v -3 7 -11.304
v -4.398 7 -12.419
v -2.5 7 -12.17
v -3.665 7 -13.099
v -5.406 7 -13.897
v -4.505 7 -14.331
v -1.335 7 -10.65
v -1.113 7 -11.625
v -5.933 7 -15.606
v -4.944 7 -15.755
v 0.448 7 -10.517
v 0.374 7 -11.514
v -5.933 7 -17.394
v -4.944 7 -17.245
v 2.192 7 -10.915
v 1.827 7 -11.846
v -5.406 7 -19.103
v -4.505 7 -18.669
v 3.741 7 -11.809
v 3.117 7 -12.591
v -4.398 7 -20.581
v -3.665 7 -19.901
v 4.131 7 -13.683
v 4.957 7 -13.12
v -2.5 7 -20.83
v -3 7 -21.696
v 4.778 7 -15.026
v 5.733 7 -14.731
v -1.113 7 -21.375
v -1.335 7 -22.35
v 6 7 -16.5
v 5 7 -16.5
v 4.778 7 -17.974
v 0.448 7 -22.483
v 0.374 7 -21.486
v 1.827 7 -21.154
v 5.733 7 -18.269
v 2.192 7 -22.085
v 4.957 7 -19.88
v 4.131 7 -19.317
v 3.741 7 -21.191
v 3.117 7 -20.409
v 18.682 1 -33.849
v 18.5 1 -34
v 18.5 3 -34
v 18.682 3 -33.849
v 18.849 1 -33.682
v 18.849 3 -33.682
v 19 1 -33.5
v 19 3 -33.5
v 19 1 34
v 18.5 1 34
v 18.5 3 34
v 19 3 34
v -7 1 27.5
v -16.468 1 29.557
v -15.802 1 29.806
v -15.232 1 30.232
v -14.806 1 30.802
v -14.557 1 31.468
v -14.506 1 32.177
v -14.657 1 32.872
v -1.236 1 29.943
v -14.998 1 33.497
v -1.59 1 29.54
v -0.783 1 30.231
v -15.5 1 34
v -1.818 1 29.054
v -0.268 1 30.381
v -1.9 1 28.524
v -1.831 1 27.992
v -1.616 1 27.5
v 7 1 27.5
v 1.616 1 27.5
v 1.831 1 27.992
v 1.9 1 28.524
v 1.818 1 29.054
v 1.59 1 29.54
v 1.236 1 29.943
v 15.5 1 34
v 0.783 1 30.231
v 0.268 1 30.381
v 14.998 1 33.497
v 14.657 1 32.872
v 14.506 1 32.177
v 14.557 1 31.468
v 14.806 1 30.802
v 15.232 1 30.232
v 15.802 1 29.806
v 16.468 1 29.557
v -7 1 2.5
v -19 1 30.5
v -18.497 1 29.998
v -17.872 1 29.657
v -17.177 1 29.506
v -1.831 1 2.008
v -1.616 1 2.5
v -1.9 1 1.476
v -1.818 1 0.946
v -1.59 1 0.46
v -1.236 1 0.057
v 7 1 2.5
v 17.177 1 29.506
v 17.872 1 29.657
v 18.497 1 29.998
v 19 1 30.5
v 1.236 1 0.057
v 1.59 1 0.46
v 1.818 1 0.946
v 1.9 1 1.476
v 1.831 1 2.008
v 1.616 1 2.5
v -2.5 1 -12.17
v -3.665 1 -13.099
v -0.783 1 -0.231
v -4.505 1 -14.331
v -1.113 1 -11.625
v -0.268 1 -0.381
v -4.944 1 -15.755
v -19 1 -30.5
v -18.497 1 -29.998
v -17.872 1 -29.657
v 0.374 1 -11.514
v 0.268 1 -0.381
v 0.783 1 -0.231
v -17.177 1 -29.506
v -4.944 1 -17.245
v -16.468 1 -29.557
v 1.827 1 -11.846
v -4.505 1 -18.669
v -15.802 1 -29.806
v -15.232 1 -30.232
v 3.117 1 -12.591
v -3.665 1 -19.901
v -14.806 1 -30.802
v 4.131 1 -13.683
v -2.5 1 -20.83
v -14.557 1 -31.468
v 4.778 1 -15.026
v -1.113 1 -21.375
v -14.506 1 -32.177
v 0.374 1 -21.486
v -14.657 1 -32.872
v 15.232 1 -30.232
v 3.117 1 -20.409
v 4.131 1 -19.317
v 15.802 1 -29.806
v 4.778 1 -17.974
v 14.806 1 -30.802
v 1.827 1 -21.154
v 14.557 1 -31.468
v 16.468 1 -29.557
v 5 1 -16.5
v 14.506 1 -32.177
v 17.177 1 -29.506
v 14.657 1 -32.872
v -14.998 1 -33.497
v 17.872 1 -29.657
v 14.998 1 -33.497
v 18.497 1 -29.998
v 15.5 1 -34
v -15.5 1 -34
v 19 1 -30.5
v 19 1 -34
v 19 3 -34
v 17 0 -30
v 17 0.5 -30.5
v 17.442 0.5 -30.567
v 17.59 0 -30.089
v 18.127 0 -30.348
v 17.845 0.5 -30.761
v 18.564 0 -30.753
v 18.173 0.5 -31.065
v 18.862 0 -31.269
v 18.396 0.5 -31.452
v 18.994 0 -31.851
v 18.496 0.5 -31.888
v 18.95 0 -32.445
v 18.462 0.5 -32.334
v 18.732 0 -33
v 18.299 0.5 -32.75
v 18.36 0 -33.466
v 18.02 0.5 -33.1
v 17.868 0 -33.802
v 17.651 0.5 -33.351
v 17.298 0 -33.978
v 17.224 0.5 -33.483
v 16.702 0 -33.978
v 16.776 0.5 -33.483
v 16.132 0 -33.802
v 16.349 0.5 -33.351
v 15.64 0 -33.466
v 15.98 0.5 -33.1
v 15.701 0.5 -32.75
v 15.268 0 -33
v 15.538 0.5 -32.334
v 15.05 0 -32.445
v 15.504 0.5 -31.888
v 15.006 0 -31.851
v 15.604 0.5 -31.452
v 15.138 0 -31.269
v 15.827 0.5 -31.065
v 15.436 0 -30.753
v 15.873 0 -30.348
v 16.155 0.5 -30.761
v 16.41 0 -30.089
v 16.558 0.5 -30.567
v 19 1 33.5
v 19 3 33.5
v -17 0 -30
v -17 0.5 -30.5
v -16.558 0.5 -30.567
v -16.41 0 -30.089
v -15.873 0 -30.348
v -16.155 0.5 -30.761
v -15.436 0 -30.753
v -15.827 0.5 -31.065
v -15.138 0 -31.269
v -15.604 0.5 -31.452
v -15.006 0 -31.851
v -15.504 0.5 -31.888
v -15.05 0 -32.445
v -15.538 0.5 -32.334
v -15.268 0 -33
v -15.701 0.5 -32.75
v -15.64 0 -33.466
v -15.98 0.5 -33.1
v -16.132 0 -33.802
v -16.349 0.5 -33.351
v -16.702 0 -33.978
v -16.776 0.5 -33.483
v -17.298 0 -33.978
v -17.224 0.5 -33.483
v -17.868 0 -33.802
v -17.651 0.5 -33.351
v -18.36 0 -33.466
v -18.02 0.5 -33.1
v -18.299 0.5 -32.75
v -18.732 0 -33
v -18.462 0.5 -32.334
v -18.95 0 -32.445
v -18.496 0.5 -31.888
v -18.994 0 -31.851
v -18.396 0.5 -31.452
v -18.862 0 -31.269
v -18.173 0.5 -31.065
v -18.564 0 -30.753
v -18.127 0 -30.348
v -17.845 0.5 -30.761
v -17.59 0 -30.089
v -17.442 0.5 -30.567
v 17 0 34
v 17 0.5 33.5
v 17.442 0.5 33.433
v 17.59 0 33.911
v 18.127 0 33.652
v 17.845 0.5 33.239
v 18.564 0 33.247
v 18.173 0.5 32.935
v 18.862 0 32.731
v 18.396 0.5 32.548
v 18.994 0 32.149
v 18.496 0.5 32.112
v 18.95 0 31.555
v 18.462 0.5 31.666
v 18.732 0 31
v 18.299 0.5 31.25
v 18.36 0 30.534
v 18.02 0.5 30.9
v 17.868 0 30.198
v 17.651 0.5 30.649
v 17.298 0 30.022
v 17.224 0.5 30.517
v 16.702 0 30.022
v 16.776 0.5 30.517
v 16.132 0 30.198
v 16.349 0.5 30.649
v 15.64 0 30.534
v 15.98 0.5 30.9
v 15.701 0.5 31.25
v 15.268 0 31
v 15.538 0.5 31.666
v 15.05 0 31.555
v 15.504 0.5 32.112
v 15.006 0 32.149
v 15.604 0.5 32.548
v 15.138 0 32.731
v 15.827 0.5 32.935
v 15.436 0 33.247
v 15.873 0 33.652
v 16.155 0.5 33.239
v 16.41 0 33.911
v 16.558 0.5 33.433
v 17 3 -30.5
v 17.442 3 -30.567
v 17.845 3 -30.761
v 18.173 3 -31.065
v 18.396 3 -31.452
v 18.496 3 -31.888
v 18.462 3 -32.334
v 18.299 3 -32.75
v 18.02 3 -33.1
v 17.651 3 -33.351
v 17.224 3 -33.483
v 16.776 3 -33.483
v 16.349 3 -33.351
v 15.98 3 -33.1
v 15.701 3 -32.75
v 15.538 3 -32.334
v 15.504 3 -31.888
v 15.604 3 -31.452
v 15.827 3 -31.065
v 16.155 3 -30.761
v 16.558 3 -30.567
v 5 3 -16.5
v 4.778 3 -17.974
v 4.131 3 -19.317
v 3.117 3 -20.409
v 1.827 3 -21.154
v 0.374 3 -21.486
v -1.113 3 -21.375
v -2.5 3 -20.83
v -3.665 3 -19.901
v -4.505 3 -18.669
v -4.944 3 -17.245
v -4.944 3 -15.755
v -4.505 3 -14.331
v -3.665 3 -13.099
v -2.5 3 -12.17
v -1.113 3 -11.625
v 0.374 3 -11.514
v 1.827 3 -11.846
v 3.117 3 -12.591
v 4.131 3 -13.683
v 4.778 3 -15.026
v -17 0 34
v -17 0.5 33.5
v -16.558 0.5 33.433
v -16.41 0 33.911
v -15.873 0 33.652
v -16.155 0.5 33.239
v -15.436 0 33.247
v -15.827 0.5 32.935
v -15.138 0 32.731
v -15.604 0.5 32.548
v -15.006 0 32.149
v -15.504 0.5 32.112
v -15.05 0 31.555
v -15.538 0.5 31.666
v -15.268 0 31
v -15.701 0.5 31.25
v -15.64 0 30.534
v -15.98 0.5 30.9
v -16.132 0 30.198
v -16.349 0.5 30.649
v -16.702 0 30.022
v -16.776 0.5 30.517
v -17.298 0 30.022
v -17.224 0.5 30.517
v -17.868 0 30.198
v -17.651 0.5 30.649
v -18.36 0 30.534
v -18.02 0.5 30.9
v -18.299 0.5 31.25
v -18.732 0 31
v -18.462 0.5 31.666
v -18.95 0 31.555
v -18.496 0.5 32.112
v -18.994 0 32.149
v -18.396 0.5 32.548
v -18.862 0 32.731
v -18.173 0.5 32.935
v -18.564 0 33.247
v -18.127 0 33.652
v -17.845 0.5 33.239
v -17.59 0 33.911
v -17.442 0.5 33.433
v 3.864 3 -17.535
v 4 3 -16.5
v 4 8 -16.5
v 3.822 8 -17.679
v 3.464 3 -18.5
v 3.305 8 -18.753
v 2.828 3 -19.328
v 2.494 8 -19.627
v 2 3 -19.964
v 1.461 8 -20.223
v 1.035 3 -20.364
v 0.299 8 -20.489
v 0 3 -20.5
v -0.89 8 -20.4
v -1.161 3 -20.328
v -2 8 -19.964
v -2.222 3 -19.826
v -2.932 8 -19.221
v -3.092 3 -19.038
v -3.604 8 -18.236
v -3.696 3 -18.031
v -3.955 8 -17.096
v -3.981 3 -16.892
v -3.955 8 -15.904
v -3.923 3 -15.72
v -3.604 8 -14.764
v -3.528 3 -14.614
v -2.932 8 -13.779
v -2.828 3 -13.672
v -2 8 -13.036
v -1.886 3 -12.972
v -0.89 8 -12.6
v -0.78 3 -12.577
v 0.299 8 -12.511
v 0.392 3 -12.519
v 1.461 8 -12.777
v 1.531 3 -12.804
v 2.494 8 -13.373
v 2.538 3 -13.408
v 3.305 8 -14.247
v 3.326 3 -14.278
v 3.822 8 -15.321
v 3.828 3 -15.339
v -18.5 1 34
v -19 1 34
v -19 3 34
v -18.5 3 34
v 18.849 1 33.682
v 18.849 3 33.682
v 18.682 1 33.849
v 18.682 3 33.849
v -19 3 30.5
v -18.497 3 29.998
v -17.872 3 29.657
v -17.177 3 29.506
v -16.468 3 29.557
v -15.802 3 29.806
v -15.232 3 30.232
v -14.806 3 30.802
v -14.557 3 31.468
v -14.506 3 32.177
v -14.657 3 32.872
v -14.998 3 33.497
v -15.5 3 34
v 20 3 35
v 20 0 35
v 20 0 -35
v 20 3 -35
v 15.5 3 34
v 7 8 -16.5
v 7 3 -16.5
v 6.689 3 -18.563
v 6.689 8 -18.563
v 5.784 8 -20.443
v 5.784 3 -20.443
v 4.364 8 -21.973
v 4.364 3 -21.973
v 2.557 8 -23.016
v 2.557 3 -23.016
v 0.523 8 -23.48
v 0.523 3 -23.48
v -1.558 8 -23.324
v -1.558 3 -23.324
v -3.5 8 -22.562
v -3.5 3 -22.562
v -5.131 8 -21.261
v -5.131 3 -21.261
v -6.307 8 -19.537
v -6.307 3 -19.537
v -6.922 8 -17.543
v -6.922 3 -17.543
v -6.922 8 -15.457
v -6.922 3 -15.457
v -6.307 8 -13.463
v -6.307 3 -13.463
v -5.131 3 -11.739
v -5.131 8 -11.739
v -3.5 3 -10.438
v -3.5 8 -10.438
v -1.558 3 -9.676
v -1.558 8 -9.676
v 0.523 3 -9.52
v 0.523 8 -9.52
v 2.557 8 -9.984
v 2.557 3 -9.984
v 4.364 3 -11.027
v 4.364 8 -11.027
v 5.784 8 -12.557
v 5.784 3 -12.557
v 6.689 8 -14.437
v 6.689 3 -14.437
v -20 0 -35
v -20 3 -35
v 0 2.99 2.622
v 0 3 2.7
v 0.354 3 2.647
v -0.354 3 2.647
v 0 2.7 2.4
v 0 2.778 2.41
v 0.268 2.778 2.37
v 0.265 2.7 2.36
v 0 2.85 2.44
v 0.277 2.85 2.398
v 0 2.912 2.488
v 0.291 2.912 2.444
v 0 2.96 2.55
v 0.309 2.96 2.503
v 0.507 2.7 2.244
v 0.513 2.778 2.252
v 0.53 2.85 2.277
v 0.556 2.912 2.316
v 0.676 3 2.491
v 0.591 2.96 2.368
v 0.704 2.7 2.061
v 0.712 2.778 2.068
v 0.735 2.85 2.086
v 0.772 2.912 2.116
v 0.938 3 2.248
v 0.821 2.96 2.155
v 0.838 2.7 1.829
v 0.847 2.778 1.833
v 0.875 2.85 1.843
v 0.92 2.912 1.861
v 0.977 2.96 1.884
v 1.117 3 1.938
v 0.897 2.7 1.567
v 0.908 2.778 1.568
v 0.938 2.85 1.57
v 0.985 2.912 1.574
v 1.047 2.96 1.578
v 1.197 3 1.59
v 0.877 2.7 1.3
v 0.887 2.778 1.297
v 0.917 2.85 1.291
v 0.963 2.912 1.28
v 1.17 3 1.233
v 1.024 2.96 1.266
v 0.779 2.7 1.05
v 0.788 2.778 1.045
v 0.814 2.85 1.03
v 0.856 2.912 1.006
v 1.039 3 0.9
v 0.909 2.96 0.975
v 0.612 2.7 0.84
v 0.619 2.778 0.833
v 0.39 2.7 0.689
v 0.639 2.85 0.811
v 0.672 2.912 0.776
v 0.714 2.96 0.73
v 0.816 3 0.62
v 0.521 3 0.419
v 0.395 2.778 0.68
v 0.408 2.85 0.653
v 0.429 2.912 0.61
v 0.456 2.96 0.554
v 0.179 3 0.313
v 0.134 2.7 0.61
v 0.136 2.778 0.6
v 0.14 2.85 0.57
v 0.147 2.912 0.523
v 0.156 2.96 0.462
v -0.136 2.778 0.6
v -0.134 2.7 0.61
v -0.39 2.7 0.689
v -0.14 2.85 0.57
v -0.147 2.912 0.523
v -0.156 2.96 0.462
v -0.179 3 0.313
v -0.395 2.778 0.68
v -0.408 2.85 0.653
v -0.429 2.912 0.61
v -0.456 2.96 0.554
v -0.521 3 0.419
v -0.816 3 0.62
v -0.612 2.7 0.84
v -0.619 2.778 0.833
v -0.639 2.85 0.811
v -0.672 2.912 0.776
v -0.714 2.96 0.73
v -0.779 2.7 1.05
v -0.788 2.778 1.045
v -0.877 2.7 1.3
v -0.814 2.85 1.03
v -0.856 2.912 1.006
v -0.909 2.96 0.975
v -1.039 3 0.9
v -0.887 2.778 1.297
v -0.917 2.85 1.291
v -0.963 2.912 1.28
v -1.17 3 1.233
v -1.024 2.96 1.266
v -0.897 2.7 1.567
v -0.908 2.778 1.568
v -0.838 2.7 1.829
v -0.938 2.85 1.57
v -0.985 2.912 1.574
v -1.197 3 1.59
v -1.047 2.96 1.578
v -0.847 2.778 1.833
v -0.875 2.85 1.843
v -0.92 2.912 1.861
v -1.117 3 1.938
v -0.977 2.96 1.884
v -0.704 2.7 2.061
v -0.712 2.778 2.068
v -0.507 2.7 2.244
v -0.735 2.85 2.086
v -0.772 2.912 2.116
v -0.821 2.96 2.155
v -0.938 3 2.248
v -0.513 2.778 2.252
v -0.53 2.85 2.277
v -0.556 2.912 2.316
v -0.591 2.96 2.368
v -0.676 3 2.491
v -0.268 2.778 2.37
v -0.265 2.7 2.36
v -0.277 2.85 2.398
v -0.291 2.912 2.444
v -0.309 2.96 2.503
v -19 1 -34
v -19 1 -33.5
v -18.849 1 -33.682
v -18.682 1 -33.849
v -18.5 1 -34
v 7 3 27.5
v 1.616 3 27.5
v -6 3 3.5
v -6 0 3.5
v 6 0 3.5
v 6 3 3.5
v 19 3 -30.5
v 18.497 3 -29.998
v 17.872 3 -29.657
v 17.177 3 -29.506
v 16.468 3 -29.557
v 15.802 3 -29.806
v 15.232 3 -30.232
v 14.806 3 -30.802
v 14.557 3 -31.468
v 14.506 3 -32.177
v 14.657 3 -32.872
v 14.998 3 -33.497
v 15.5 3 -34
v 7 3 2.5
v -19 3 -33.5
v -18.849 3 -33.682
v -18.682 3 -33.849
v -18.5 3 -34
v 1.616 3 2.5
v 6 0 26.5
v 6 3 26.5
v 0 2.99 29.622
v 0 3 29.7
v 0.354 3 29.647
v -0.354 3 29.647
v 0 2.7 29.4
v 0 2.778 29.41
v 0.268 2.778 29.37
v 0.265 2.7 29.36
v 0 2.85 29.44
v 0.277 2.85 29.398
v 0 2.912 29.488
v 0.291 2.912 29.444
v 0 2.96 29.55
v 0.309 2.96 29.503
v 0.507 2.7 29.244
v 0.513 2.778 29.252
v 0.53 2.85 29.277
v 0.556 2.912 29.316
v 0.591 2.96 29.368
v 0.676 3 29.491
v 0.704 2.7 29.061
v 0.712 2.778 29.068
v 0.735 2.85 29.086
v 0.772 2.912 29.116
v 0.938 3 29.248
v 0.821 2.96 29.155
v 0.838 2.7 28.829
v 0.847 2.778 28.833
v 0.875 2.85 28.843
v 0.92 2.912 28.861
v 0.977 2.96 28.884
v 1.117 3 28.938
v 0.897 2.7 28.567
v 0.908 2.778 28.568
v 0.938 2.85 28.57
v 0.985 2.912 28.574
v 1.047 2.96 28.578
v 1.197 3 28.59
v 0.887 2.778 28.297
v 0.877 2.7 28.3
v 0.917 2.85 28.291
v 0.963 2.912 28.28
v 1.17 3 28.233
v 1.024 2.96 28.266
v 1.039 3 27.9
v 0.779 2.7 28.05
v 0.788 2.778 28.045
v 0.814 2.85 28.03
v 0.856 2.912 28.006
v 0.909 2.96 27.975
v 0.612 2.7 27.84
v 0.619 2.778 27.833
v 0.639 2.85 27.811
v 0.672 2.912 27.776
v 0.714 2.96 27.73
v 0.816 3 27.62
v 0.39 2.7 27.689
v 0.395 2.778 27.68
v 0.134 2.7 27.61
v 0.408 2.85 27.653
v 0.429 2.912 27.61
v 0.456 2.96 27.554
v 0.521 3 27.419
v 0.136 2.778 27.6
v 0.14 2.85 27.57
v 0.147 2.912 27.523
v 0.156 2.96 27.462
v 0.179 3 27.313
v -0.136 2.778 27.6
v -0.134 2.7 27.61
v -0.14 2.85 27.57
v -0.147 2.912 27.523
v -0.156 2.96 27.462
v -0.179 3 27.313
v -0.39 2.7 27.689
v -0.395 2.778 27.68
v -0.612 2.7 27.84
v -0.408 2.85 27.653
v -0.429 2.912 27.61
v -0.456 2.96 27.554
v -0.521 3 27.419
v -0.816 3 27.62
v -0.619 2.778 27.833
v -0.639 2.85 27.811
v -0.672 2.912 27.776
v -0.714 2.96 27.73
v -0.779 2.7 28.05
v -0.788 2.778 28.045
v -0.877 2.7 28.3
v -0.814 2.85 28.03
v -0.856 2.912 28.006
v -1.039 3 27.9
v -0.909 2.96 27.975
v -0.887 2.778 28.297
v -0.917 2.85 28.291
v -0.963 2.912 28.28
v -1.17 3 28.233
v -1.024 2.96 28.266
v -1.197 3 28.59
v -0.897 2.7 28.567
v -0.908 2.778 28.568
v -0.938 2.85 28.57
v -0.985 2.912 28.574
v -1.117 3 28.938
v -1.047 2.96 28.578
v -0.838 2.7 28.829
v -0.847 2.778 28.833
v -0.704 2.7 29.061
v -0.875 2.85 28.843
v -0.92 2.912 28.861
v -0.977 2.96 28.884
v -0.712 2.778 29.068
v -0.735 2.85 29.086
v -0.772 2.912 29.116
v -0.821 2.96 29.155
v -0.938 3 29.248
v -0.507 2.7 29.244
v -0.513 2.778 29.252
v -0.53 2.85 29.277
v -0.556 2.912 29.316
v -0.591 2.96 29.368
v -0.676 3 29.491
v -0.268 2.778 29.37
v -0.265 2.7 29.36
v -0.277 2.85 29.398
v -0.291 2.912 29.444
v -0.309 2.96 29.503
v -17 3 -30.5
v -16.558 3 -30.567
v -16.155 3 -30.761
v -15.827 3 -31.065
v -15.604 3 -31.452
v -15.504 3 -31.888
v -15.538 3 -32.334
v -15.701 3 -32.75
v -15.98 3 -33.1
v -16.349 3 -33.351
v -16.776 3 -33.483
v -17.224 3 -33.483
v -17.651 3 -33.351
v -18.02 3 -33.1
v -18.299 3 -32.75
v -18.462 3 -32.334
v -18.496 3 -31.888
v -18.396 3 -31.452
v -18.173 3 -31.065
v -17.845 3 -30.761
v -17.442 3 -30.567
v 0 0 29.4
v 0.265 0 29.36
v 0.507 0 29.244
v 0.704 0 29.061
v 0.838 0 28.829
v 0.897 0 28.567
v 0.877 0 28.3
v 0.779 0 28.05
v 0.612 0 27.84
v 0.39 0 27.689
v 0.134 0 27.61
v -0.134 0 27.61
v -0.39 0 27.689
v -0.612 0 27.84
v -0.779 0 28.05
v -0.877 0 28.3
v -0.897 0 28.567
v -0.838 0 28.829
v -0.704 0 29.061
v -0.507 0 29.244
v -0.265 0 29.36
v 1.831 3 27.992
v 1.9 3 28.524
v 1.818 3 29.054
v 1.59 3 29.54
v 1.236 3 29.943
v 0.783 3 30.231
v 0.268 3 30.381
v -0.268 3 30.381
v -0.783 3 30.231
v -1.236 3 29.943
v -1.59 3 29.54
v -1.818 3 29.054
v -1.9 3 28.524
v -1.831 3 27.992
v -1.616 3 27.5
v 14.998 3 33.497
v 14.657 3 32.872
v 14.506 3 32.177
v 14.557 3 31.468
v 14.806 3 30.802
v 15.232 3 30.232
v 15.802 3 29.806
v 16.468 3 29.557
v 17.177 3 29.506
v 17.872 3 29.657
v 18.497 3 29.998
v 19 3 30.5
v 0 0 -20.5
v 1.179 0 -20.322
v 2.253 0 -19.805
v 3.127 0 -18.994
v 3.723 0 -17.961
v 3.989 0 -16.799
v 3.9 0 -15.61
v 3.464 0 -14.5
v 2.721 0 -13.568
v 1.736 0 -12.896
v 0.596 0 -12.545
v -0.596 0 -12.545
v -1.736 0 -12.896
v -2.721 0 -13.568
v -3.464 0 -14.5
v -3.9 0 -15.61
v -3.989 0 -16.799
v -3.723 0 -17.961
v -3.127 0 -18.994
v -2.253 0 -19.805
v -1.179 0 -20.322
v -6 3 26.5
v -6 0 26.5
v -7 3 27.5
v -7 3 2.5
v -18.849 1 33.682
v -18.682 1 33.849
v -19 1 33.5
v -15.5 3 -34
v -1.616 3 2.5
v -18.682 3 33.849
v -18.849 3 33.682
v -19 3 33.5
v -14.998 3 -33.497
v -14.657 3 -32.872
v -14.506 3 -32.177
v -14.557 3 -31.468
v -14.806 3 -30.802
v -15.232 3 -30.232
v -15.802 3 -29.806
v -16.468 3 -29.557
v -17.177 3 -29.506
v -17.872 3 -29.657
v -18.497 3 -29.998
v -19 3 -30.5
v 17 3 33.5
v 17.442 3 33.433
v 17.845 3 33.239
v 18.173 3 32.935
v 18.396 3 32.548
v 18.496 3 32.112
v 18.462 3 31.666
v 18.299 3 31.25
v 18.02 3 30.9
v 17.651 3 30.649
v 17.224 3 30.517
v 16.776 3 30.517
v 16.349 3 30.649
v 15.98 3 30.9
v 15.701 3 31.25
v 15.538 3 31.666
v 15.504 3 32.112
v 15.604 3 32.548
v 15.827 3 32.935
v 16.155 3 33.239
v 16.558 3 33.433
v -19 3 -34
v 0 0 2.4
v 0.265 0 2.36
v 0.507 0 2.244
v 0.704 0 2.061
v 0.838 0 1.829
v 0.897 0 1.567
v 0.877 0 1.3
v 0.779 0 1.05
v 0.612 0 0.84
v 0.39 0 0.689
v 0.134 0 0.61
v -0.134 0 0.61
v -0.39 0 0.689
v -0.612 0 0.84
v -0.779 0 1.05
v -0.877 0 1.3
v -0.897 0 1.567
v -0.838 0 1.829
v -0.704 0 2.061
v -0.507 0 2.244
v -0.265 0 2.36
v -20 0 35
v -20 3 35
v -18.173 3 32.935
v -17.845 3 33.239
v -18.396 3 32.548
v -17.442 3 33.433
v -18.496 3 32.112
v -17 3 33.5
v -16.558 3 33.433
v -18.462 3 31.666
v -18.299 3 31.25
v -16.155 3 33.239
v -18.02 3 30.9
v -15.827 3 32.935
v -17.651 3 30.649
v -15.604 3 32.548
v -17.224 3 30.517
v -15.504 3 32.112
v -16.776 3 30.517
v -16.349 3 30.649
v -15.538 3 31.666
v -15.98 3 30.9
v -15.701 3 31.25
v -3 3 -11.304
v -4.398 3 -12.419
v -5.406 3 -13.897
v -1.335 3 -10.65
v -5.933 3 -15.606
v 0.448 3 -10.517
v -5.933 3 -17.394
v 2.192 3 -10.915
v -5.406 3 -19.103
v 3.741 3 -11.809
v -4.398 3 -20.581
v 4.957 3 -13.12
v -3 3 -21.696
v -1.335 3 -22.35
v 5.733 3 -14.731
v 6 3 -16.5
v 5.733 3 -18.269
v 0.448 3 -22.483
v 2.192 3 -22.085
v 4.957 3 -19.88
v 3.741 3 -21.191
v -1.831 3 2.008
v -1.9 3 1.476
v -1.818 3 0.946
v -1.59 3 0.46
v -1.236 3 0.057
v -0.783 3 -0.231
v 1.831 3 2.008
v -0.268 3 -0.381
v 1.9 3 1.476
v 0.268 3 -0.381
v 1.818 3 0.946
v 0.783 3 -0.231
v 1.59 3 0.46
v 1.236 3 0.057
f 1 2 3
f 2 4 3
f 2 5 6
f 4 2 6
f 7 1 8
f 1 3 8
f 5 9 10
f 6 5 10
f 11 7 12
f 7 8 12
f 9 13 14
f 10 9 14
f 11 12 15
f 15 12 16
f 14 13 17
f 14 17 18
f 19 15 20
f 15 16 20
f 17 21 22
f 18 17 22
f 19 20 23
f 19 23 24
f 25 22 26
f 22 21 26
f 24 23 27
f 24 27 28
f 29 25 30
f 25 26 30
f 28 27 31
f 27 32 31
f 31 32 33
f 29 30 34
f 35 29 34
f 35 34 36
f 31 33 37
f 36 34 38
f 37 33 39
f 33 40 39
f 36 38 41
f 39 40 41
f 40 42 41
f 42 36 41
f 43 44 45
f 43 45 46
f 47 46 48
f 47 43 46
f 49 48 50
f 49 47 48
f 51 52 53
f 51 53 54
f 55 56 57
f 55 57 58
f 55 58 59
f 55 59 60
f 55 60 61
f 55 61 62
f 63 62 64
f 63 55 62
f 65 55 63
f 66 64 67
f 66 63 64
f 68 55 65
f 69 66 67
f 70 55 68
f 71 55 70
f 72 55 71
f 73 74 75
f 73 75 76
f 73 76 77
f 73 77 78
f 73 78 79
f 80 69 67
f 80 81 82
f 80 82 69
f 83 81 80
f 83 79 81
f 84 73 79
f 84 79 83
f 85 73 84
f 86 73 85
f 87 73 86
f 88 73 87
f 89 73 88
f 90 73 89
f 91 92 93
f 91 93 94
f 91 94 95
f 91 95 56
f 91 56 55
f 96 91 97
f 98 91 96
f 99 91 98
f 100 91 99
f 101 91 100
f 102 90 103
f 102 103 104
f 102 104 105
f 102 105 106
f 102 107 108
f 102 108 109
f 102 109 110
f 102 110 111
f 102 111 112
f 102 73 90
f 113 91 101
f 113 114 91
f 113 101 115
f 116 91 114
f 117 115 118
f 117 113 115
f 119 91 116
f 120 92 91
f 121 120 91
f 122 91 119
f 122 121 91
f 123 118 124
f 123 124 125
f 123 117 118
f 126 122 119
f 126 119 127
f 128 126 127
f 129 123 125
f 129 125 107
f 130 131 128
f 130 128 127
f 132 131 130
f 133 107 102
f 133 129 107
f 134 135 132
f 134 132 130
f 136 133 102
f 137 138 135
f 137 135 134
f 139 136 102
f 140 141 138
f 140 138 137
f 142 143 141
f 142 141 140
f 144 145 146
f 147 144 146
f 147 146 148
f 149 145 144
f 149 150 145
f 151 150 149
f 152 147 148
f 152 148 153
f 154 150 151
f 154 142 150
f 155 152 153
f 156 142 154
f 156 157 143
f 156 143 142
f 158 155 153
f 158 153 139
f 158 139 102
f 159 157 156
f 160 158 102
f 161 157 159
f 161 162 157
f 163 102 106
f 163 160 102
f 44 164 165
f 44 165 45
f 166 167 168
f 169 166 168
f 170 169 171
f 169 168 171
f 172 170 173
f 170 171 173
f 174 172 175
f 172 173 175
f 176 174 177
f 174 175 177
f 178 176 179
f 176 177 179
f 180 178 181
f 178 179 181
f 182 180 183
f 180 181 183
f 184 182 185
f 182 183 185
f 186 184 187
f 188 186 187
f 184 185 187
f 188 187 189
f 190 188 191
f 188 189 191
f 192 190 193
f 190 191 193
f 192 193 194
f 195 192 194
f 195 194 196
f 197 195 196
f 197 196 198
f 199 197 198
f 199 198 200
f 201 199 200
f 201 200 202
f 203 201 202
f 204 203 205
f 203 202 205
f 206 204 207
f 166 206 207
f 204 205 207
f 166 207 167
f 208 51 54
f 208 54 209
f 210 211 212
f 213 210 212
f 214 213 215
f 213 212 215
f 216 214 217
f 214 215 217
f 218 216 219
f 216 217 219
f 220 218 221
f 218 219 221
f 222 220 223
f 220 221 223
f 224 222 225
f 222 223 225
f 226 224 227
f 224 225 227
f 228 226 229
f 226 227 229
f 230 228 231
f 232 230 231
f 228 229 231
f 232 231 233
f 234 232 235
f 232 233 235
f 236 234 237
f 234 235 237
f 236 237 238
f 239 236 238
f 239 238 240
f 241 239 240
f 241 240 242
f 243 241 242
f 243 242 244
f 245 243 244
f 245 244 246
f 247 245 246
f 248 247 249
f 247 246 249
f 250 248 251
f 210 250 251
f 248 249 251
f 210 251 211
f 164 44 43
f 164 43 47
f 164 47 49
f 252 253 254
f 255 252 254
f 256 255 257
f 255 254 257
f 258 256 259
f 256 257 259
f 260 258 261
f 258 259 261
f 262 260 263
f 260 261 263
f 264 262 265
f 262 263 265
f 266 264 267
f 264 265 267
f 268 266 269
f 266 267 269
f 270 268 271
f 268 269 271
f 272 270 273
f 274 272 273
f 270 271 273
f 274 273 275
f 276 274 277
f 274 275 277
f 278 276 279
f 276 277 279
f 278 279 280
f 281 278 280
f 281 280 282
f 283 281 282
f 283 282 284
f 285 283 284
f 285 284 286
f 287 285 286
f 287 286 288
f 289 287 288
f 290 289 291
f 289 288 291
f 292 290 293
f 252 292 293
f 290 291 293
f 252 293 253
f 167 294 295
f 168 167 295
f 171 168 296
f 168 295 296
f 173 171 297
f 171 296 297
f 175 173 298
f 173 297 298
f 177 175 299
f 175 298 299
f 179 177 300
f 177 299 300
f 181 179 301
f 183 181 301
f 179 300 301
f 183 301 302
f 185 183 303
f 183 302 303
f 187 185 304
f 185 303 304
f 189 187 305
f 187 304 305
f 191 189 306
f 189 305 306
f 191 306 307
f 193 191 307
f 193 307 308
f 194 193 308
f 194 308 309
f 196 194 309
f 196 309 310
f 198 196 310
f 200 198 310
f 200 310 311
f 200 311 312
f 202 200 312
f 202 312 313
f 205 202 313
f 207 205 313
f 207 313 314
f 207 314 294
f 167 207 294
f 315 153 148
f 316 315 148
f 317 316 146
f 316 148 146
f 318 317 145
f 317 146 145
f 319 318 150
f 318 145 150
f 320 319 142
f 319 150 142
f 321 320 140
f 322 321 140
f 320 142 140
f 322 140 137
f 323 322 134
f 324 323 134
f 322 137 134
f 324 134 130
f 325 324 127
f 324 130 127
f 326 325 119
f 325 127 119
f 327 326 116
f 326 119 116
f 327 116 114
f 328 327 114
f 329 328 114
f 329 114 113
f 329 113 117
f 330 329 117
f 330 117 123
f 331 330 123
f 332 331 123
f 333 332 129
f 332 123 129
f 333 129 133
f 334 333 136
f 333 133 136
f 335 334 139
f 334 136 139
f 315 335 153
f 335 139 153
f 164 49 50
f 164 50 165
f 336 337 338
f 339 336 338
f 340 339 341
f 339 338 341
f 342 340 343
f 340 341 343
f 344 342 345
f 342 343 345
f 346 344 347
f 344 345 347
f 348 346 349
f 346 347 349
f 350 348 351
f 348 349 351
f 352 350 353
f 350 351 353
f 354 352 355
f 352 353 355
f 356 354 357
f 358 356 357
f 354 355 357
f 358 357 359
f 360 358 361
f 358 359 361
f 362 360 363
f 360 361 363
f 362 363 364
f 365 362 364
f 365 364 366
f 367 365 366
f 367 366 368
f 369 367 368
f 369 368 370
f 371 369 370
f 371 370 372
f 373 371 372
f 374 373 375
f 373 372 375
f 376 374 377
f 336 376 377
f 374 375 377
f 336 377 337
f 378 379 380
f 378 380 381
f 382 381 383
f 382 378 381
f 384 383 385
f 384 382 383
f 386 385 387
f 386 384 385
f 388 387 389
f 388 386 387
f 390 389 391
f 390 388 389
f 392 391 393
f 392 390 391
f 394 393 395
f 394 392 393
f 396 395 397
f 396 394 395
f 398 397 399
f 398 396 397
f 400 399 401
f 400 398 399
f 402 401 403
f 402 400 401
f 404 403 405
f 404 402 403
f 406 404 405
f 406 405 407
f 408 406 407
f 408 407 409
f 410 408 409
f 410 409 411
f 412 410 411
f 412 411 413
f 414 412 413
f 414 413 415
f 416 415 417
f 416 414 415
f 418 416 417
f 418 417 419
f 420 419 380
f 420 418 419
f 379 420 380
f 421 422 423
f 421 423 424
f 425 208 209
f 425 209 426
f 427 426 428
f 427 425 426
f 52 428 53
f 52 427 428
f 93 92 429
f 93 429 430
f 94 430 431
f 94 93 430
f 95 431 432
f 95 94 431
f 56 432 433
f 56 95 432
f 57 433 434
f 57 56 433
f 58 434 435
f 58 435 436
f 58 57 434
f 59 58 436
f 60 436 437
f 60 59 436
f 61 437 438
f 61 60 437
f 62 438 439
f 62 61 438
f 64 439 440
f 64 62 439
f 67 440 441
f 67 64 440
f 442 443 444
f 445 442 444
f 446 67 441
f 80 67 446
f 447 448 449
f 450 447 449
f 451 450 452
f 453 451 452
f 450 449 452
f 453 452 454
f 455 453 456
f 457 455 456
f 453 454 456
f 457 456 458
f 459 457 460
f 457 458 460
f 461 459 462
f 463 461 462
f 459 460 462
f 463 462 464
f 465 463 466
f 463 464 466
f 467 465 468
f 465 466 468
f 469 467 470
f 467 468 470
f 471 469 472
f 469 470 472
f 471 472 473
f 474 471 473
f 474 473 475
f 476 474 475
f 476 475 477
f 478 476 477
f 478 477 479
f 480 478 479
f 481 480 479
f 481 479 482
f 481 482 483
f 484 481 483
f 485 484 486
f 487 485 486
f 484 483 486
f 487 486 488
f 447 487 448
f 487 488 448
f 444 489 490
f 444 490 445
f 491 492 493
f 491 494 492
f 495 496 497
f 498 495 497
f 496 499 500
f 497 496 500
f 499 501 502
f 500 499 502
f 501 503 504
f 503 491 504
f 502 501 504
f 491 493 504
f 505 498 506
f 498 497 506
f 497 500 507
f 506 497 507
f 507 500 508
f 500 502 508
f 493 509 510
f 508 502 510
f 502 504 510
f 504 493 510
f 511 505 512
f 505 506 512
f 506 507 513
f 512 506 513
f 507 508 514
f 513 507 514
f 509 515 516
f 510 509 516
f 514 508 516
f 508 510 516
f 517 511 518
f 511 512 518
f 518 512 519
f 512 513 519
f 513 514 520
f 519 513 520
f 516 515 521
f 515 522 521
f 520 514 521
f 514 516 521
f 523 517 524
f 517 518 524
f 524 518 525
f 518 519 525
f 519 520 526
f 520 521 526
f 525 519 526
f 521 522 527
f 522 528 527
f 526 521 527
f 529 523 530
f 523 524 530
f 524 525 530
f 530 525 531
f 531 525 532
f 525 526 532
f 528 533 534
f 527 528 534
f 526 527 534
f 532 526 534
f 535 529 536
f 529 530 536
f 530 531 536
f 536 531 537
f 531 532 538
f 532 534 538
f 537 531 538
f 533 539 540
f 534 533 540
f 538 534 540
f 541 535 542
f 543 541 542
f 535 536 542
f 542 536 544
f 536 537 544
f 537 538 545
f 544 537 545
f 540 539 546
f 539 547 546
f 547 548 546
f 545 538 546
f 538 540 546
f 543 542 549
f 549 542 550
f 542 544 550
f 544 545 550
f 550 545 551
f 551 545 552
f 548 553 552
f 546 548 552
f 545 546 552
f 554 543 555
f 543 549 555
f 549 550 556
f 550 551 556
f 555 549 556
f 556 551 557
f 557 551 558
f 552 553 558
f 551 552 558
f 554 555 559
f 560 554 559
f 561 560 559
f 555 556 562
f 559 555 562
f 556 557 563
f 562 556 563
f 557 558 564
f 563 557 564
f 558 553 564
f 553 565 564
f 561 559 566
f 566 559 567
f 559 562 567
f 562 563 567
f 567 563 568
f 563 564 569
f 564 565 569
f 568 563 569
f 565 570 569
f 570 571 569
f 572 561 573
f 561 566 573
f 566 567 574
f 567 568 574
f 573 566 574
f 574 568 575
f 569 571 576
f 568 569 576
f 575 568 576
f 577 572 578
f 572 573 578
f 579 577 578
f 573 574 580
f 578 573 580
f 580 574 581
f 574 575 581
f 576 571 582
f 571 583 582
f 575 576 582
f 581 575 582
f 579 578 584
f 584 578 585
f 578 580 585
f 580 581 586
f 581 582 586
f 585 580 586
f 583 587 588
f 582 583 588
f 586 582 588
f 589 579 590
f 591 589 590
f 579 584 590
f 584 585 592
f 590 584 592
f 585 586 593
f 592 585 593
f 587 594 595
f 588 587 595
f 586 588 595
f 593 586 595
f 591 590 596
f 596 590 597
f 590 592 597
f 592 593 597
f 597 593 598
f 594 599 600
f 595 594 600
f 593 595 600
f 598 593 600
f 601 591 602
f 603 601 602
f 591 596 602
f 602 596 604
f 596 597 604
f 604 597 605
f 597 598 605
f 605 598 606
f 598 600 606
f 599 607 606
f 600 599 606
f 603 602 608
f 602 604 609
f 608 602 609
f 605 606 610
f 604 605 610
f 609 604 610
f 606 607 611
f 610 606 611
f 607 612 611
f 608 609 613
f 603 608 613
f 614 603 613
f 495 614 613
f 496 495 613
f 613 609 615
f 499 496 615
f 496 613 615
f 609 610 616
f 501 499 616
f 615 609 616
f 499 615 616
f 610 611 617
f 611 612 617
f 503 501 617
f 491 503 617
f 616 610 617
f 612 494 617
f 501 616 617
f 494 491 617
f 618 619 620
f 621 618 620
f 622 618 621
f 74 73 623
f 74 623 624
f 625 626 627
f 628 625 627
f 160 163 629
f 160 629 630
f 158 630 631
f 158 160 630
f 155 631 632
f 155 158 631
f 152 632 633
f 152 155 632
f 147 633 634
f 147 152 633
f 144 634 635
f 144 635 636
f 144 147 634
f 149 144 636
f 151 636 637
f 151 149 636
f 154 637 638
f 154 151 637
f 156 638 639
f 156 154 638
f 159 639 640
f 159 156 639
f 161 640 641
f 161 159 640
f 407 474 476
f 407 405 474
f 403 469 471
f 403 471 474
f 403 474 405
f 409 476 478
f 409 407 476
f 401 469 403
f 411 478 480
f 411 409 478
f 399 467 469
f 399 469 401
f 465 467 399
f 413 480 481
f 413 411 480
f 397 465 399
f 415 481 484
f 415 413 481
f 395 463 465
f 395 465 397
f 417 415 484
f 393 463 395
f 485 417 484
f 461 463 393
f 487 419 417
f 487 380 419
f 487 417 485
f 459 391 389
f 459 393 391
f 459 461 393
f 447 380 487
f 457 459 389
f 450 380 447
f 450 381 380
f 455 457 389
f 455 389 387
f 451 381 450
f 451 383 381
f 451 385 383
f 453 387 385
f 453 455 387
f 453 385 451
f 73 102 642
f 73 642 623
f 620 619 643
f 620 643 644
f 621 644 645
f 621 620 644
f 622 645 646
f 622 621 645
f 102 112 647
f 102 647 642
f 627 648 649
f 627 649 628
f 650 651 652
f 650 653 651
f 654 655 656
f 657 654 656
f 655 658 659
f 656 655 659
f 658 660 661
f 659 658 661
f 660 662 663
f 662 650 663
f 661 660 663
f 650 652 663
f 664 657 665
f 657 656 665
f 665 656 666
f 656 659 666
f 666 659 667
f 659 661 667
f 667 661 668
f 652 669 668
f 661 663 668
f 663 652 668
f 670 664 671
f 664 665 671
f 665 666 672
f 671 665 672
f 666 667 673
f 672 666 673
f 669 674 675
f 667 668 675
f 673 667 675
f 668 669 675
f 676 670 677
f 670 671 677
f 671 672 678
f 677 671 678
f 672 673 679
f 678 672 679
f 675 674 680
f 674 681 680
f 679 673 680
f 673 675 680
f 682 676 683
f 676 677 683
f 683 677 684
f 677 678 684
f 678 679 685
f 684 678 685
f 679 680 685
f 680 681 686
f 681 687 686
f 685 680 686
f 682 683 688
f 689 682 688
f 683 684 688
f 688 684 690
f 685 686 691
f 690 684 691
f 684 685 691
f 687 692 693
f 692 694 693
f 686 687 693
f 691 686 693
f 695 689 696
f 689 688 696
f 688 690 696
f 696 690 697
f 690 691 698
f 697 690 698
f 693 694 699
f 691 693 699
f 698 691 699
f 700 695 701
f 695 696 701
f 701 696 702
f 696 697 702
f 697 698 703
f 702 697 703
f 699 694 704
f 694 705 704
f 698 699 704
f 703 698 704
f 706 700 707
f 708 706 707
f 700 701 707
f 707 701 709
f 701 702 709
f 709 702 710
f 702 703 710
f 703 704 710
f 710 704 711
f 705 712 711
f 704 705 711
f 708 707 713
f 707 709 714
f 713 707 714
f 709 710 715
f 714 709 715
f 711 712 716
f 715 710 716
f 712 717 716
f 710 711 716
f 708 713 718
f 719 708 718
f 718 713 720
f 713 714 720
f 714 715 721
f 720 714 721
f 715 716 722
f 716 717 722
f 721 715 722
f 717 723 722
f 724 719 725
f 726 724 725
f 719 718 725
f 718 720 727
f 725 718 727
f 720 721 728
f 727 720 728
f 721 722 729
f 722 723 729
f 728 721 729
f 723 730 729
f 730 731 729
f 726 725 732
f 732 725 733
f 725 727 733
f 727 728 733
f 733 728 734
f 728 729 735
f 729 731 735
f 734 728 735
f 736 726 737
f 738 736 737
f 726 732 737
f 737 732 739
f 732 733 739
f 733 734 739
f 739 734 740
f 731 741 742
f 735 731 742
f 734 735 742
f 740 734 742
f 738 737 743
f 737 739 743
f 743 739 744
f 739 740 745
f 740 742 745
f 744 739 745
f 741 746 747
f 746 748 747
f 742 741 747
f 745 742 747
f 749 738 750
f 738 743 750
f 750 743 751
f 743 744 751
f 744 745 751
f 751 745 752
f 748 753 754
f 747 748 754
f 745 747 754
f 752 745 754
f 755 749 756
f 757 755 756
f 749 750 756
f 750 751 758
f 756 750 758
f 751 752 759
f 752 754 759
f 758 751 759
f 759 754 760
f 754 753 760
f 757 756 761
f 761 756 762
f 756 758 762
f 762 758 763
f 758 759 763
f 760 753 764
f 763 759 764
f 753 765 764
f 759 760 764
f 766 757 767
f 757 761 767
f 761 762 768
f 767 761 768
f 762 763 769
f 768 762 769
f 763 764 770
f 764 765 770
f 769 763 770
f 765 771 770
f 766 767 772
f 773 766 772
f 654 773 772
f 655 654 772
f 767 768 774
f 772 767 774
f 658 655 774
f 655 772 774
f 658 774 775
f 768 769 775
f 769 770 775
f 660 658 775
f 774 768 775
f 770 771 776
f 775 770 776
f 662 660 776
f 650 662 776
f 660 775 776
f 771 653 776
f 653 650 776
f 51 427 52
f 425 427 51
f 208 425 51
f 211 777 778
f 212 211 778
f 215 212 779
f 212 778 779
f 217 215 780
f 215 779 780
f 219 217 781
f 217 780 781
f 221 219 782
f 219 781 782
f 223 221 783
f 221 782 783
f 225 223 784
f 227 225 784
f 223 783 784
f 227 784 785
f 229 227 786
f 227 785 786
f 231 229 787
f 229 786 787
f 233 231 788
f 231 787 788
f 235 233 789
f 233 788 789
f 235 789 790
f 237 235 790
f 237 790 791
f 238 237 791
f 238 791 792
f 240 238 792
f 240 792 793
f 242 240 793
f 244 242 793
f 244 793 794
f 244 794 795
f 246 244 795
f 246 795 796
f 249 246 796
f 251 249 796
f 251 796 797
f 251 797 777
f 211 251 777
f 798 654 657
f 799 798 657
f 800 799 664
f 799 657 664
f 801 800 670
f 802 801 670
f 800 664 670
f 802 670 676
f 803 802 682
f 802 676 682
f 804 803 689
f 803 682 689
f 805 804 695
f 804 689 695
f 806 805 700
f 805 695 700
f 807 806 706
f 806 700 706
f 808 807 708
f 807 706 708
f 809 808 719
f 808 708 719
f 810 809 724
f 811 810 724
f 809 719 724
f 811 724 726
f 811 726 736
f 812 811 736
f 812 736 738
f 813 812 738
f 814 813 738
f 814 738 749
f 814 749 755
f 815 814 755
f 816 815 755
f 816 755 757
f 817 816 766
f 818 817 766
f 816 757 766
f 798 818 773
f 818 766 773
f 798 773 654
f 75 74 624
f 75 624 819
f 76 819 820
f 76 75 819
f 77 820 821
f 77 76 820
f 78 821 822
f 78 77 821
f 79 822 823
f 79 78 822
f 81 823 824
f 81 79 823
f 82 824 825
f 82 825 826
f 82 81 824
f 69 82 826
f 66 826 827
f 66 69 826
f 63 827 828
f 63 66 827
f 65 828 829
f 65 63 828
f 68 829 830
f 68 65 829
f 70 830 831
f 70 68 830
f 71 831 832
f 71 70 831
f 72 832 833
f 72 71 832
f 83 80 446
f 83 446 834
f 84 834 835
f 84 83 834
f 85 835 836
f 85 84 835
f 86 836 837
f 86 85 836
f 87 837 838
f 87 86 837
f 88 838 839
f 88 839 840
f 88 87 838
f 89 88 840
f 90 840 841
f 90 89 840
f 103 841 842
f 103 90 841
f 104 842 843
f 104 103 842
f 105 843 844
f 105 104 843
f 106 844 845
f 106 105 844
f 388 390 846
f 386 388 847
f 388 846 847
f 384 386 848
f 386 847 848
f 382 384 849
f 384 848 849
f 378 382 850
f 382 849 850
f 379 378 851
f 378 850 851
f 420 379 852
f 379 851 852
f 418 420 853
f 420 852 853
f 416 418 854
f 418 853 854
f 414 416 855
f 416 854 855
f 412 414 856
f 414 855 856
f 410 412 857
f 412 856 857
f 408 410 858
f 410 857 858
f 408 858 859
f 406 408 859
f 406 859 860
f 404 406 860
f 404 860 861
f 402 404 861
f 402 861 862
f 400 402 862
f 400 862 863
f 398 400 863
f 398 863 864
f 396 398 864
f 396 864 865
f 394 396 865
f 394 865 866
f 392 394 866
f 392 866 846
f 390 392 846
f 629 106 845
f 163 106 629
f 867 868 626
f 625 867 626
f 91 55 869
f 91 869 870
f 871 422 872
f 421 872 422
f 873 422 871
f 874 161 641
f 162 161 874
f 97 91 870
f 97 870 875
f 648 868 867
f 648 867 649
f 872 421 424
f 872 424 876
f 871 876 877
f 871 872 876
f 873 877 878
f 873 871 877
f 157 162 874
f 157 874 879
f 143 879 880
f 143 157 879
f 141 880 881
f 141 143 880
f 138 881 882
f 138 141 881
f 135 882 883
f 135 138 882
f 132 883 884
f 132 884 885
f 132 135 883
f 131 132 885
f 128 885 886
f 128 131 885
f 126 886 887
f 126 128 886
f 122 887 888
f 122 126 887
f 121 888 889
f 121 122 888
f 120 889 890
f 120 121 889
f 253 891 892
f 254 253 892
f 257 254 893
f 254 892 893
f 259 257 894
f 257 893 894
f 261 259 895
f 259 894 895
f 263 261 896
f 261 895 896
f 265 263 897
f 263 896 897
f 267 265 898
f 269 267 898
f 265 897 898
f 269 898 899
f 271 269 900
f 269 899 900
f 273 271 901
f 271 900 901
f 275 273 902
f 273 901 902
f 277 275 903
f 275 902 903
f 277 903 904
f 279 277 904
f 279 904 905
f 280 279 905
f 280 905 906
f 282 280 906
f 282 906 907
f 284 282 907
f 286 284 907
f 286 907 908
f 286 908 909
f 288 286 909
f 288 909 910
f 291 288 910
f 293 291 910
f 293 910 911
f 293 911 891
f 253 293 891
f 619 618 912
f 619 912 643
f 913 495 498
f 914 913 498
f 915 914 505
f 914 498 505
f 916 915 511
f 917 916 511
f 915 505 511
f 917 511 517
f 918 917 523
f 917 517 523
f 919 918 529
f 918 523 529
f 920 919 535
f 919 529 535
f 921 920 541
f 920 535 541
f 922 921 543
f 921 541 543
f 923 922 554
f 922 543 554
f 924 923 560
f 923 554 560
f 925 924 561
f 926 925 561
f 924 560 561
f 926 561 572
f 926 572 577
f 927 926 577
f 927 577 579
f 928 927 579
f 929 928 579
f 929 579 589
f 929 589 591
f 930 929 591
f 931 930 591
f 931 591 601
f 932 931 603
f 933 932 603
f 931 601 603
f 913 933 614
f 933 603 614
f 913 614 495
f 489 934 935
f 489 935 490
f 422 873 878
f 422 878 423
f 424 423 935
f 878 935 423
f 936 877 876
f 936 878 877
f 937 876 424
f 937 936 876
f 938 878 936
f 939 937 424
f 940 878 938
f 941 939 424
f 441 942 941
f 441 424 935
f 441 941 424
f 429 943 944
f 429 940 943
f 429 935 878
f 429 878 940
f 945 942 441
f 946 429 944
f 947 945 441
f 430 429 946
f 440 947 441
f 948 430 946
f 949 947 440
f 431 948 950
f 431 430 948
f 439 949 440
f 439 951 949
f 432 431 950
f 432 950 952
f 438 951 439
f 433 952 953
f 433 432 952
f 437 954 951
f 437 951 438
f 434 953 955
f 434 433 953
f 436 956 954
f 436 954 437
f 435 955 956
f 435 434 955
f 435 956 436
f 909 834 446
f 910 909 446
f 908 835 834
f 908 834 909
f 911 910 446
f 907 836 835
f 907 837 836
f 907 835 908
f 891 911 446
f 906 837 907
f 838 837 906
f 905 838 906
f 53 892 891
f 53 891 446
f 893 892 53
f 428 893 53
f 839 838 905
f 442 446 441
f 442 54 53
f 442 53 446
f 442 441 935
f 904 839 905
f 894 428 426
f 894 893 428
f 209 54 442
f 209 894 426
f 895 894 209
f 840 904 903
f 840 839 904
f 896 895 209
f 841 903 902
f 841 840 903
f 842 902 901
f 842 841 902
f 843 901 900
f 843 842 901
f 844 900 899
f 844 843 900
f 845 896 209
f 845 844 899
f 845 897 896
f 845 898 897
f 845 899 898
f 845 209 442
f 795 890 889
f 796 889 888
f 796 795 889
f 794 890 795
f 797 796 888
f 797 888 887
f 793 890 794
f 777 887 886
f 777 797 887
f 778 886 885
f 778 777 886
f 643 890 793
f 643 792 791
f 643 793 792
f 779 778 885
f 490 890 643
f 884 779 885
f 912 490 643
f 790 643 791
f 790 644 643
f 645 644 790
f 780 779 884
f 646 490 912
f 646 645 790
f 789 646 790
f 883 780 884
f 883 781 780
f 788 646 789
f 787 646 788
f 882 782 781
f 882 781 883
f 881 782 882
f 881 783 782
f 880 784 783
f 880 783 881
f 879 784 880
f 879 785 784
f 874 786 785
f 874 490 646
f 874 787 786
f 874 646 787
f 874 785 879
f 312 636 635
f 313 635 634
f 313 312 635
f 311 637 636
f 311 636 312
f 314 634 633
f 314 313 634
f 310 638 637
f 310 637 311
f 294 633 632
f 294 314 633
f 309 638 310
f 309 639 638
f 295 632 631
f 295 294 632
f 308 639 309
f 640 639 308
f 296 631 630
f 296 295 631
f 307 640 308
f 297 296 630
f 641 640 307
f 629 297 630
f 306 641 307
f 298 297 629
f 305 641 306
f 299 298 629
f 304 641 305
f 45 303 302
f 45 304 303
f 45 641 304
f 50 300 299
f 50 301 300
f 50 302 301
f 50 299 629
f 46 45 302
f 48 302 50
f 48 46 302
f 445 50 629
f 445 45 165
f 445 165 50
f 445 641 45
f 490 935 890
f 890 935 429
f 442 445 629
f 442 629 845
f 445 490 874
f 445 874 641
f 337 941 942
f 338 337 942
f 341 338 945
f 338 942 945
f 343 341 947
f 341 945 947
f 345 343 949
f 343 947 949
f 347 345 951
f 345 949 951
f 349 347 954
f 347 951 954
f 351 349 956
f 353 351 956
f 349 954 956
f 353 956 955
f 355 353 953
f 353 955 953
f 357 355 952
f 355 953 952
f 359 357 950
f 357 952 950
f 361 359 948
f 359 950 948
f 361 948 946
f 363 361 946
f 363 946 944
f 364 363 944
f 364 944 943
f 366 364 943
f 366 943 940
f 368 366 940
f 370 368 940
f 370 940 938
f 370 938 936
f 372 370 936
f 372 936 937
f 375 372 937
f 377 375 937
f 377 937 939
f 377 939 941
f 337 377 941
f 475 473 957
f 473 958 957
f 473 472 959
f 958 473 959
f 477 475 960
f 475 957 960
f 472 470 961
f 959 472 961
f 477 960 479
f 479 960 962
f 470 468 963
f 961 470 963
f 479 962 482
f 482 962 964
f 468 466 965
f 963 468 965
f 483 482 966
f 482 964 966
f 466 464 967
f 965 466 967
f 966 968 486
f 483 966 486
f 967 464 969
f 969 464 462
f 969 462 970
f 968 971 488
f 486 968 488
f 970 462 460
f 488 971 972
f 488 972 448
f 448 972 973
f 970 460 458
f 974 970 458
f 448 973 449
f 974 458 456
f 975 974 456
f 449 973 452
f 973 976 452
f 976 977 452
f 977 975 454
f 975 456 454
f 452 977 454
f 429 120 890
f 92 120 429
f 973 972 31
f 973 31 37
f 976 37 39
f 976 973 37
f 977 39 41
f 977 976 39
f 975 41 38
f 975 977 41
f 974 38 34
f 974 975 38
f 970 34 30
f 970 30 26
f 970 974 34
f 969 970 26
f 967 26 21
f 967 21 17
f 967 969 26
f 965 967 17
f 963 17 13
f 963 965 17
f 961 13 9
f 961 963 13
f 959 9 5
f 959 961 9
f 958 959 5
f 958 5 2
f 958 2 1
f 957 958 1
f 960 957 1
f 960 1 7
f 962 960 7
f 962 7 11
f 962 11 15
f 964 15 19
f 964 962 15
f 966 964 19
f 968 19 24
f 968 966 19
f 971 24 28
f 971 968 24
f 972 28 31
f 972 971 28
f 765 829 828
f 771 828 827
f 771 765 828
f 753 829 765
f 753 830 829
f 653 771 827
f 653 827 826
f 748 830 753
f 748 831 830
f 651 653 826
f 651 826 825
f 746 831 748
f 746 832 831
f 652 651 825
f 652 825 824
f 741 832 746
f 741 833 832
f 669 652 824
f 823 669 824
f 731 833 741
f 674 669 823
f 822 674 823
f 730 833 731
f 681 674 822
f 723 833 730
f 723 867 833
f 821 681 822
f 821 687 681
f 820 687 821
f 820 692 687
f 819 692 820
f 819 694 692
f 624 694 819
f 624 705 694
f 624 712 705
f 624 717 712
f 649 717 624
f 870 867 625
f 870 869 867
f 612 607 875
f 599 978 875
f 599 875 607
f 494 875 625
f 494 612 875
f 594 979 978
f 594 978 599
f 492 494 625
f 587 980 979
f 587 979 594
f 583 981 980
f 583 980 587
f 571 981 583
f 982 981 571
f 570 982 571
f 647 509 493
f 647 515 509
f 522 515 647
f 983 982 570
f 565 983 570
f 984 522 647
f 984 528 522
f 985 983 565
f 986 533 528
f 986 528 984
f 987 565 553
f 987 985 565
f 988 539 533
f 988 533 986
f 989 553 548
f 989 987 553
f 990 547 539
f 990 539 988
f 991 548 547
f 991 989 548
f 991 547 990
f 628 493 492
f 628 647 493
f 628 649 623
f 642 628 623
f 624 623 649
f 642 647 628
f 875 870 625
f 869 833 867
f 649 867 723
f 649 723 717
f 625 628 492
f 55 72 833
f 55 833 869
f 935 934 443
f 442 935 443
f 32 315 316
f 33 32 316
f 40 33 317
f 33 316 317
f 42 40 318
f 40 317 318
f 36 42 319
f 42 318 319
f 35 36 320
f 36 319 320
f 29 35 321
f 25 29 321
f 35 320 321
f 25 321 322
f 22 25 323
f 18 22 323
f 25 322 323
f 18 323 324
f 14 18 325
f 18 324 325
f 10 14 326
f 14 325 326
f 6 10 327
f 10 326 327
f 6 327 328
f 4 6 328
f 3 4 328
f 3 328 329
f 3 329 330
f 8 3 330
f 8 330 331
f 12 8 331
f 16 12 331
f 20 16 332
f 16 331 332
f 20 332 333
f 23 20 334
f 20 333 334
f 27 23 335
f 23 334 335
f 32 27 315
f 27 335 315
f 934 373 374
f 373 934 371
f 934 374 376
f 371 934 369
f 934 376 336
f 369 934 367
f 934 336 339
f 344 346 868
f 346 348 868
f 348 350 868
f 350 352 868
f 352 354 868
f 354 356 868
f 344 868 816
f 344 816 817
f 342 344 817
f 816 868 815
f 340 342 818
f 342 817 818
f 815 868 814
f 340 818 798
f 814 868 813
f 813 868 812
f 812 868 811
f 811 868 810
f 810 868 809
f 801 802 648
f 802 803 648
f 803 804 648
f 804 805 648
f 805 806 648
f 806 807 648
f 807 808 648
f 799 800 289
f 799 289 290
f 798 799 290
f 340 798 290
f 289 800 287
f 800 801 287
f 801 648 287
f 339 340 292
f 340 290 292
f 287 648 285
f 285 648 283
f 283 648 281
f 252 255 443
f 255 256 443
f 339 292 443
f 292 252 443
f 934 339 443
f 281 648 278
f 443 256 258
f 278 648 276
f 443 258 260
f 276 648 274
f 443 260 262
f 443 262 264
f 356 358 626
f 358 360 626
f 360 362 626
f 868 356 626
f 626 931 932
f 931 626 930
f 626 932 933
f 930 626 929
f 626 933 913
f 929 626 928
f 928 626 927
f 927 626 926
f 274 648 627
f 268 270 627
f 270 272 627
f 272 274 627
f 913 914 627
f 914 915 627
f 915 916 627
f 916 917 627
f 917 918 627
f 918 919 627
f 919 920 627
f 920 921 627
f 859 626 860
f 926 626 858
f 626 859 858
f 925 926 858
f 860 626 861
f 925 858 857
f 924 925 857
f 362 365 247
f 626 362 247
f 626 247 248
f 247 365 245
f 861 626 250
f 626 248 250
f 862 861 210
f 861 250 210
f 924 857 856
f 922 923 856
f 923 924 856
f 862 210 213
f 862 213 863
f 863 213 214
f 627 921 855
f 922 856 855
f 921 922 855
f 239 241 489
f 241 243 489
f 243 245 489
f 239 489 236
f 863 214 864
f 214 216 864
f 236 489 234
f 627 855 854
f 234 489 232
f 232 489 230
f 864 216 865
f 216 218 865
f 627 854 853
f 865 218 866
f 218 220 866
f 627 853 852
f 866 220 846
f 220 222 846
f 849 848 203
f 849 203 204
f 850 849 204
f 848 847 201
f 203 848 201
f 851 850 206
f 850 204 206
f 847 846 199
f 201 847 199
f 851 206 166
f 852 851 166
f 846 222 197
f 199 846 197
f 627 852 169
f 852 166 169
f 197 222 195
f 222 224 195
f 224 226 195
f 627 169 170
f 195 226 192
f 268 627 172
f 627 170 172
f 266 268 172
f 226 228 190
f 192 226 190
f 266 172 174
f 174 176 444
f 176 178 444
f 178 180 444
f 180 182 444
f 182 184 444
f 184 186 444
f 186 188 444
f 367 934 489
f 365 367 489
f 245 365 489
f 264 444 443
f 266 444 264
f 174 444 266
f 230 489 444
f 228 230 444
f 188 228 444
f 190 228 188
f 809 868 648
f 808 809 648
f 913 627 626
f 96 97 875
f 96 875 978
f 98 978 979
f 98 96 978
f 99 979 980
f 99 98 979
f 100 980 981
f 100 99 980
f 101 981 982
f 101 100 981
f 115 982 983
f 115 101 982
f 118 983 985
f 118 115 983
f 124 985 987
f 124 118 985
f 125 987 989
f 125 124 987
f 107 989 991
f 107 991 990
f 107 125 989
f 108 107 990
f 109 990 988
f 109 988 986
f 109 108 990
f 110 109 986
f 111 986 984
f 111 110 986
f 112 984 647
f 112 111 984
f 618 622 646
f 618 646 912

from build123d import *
from build123d.topology import SkipClean

# Parameters (mm, degrees)
SKETCH_1_W            = 40
SKETCH_1_H            = 70
SKETCH_1_W_2          = 12
SKETCH_1_H_2          = 23
EXTRUDE_1_DEPTH       = 3
SKETCH_2_R            = 0.9
CUT_EXTRUDE_1_DEPTH   = 3
SKETCH_3_R            = 1.5
CUT_EXTRUDE_2_DEPTH   = 41.422765863
CHAMFER_1_SIZE        = 0.5
FILLET_1_R            = 0.3
SKETCH_4_R            = 4
CUT_EXTRUDE_3_DEPTH   = 41.422765863
SKETCH_6_R            = 7
SKETCH_6_R_2          = 4
EXTRUDE_1_2_DEPTH     = 5
SHELL_START           = 1
SHELL_1_OUTLINE_R     = 5
SHELL_1_DEPTH         = 2
SHELL_START_2         = 3
SHELL_1_2_OUTLINE_R   = 6
SHELL_1_2_OUTLINE_R_2 = 5
SHELL_1_2_DEPTH       = 4


# Read off the part's stored shape, not the designer's step: 抽壳1
with BuildPart() as part:
    # 草图1 → Extrude 1 (new body)
    with BuildSketch(Plane(origin=(0, 0, 0), x_dir=(1, 0, 0), z_dir=(0, 1, 0))):
        Rectangle(SKETCH_1_W, SKETCH_1_H)
        with Locations((0, -15)):
            Rectangle(SKETCH_1_W_2, SKETCH_1_H_2, mode=Mode.SUBTRACT)
    extrude(amount=EXTRUDE_1_DEPTH)

    # 草图2 → 切除-拉伸1 (cut)
    with BuildSketch(Plane(origin=(0, 3, 0), x_dir=(1, 0, 0), z_dir=(0, 1, 0))):
        with Locations(Location((0, -28.5, 0), (0, 0, 270))):
            Circle(SKETCH_2_R)
        with Locations(Location((0, -1.5, 0), (0, 0, 270))):
            Circle(SKETCH_2_R)
    extrude(amount=-CUT_EXTRUDE_1_DEPTH, mode=Mode.SUBTRACT)

    # 草图3 → 切除-拉伸2 (cut, through all)
    with BuildSketch(Plane(origin=(0, 3, 0), x_dir=(1, 0, 0), z_dir=(0, 1, 0))):
        with Locations(Location((-17, 32, 0), (0, 0, 270))):
            Circle(SKETCH_3_R)
        with Locations(Location((17, 32, 0), (0, 0, 270))):
            Circle(SKETCH_3_R)
        with Locations(Location((-17, -32, 0), (0, 0, 270))):
            Circle(SKETCH_3_R)
        with Locations(Location((17, -32, 0), (0, 0, 270))):
            Circle(SKETCH_3_R)
    extrude(amount=-CUT_EXTRUDE_2_DEPTH, mode=Mode.SUBTRACT)

    # 倒角1
    chamfer_1_edges = [part.edges().sort_by_distance(p)[0] for p in [
        (17, 0, -33.5),
        (-17, 0, 30.5),
        (17, 0, 30.5),
        (-17, 0, -33.5),
    ]]
    chamfer(chamfer_1_edges, length=CHAMFER_1_SIZE)

    # 圆角1
    fillet_1_edges = [part.edges().sort_by_distance(p)[0] for p in [
        (0, 3, 27.6),
        (0, 3, 0.6),
    ]]
    fillet(fillet_1_edges, radius=FILLET_1_R)

    # 草图4 → 切除-拉伸3 (cut, through all)
    with BuildSketch(Plane.XZ):
        with Locations(Location((0, -16.5, 0), (0, 0, 270))):
            Circle(SKETCH_4_R)
    extrude(amount=-CUT_EXTRUDE_3_DEPTH, mode=Mode.SUBTRACT)

    # 草图6 → Extrude 1 2 (add)
    with SkipClean():  # the faces are left unmerged after this step: merging them gives an invalid solid
        with BuildSketch(Plane(origin=(0, 3, 0), x_dir=(1, 0, 0), z_dir=(0, 1, 0))):
            with Locations((0, 16.5)):
                Circle(SKETCH_6_R)
            with Locations((0, 16.5)):
                Circle(SKETCH_6_R_2, mode=Mode.SUBTRACT)
        extrude(amount=EXTRUDE_1_2_DEPTH)

    # 抽壳1 outline → 抽壳1 (cut)
    # profile 1 of 5: a face of its own
    with SkipClean():  # the faces are left unmerged after this step: merging them gives an invalid solid
        with BuildSketch(Plane(origin=(0, 0, 0), x_dir=(1, 0, 0), z_dir=(0, 1, 0)).offset(SHELL_START)):
            with BuildLine():
                ThreePointArc((-18.5, -34), (-18.767766953, -33.767766953), (-19, -33.5))
                Line((-19, -33.5), (-19, -34))
                Line((-19, -34), (-18.5, -34))
            make_face()
        # profile 2 of 5: a face of its own
        with BuildSketch(Plane(origin=(0, 0, 0), x_dir=(1, 0, 0), z_dir=(0, 1, 0)).offset(SHELL_START)):
            with BuildLine():
                ThreePointArc((-19, -30.5), (-15.232233047, -30.232233047), (-15.5, -34))
                Line((-15.5, -34), (15.5, -34))
                ThreePointArc((15.5, -34), (15.232233047, -30.232233047), (19, -30.5))
                Line((19, -30.5), (19, 30.5))
                ThreePointArc((19, 30.5), (15.232233047, 30.232233047), (15.5, 34))
                Line((15.5, 34), (-15.5, 34))
                ThreePointArc((-15.5, 34), (-15.232233047, 30.232233047), (-19, 30.5))
                Line((-19, 30.5), (-19, -30.5))
            make_face()
            with BuildLine():
                ThreePointArc((1.615549442, -27.5), (0, -30.4), (-1.615549442, -27.5))
                Line((-1.615549442, -27.5), (-7, -27.5))
                Line((-7, -27.5), (-7, -2.5))
                Line((-7, -2.5), (-1.615549442, -2.5))
                ThreePointArc((-1.615549442, -2.5), (0, 0.4), (1.615549442, -2.5))
                Line((1.615549442, -2.5), (7, -2.5))
                Line((7, -2.5), (7, -27.5))
                Line((7, -27.5), (1.615549442, -27.5))
            make_face(mode=Mode.SUBTRACT)
            with Locations((0, 16.5)):
                Circle(SHELL_1_OUTLINE_R, mode=Mode.SUBTRACT)
        # profile 3 of 5: a face of its own
        with BuildSketch(Plane(origin=(0, 0, 0), x_dir=(1, 0, 0), z_dir=(0, 1, 0)).offset(SHELL_START)):
            with BuildLine():
                Line((-19, 34), (-19, 33.5))
                ThreePointArc((-19, 33.5), (-18.767766953, 33.767766953), (-18.5, 34))
                Line((-18.5, 34), (-19, 34))
            make_face()
        # profile 4 of 5: a face of its own
        with BuildSketch(Plane(origin=(0, 0, 0), x_dir=(1, 0, 0), z_dir=(0, 1, 0)).offset(SHELL_START)):
            with BuildLine():
                Line((18.5, -34), (19, -34))
                Line((19, -34), (19, -33.5))
                ThreePointArc((19, -33.5), (18.767766953, -33.767766953), (18.5, -34))
            make_face()
        # profile 5 of 5: a face of its own
        with BuildSketch(Plane(origin=(0, 0, 0), x_dir=(1, 0, 0), z_dir=(0, 1, 0)).offset(SHELL_START)):
            with BuildLine():
                Line((19, 34), (18.5, 34))
                ThreePointArc((18.5, 34), (18.767766953, 33.767766953), (19, 33.5))
                Line((19, 33.5), (19, 34))
            make_face()
        extrude(amount=SHELL_1_DEPTH, mode=Mode.SUBTRACT)

    # Shell 1 2 outline → Shell 1 2 (cut)
    with SkipClean():  # the faces are left unmerged after this step: merging them gives an invalid solid
        with BuildSketch(Plane(origin=(0, 0, 0), x_dir=(1, 0, 0), z_dir=(0, 1, 0)).offset(SHELL_START_2)):
            with Locations((0, 16.5)):
                Circle(SHELL_1_2_OUTLINE_R)
            with Locations((0, 16.5)):
                Circle(SHELL_1_2_OUTLINE_R_2, mode=Mode.SUBTRACT)
        extrude(amount=SHELL_1_2_DEPTH, mode=Mode.SUBTRACT)


solid = part.part
